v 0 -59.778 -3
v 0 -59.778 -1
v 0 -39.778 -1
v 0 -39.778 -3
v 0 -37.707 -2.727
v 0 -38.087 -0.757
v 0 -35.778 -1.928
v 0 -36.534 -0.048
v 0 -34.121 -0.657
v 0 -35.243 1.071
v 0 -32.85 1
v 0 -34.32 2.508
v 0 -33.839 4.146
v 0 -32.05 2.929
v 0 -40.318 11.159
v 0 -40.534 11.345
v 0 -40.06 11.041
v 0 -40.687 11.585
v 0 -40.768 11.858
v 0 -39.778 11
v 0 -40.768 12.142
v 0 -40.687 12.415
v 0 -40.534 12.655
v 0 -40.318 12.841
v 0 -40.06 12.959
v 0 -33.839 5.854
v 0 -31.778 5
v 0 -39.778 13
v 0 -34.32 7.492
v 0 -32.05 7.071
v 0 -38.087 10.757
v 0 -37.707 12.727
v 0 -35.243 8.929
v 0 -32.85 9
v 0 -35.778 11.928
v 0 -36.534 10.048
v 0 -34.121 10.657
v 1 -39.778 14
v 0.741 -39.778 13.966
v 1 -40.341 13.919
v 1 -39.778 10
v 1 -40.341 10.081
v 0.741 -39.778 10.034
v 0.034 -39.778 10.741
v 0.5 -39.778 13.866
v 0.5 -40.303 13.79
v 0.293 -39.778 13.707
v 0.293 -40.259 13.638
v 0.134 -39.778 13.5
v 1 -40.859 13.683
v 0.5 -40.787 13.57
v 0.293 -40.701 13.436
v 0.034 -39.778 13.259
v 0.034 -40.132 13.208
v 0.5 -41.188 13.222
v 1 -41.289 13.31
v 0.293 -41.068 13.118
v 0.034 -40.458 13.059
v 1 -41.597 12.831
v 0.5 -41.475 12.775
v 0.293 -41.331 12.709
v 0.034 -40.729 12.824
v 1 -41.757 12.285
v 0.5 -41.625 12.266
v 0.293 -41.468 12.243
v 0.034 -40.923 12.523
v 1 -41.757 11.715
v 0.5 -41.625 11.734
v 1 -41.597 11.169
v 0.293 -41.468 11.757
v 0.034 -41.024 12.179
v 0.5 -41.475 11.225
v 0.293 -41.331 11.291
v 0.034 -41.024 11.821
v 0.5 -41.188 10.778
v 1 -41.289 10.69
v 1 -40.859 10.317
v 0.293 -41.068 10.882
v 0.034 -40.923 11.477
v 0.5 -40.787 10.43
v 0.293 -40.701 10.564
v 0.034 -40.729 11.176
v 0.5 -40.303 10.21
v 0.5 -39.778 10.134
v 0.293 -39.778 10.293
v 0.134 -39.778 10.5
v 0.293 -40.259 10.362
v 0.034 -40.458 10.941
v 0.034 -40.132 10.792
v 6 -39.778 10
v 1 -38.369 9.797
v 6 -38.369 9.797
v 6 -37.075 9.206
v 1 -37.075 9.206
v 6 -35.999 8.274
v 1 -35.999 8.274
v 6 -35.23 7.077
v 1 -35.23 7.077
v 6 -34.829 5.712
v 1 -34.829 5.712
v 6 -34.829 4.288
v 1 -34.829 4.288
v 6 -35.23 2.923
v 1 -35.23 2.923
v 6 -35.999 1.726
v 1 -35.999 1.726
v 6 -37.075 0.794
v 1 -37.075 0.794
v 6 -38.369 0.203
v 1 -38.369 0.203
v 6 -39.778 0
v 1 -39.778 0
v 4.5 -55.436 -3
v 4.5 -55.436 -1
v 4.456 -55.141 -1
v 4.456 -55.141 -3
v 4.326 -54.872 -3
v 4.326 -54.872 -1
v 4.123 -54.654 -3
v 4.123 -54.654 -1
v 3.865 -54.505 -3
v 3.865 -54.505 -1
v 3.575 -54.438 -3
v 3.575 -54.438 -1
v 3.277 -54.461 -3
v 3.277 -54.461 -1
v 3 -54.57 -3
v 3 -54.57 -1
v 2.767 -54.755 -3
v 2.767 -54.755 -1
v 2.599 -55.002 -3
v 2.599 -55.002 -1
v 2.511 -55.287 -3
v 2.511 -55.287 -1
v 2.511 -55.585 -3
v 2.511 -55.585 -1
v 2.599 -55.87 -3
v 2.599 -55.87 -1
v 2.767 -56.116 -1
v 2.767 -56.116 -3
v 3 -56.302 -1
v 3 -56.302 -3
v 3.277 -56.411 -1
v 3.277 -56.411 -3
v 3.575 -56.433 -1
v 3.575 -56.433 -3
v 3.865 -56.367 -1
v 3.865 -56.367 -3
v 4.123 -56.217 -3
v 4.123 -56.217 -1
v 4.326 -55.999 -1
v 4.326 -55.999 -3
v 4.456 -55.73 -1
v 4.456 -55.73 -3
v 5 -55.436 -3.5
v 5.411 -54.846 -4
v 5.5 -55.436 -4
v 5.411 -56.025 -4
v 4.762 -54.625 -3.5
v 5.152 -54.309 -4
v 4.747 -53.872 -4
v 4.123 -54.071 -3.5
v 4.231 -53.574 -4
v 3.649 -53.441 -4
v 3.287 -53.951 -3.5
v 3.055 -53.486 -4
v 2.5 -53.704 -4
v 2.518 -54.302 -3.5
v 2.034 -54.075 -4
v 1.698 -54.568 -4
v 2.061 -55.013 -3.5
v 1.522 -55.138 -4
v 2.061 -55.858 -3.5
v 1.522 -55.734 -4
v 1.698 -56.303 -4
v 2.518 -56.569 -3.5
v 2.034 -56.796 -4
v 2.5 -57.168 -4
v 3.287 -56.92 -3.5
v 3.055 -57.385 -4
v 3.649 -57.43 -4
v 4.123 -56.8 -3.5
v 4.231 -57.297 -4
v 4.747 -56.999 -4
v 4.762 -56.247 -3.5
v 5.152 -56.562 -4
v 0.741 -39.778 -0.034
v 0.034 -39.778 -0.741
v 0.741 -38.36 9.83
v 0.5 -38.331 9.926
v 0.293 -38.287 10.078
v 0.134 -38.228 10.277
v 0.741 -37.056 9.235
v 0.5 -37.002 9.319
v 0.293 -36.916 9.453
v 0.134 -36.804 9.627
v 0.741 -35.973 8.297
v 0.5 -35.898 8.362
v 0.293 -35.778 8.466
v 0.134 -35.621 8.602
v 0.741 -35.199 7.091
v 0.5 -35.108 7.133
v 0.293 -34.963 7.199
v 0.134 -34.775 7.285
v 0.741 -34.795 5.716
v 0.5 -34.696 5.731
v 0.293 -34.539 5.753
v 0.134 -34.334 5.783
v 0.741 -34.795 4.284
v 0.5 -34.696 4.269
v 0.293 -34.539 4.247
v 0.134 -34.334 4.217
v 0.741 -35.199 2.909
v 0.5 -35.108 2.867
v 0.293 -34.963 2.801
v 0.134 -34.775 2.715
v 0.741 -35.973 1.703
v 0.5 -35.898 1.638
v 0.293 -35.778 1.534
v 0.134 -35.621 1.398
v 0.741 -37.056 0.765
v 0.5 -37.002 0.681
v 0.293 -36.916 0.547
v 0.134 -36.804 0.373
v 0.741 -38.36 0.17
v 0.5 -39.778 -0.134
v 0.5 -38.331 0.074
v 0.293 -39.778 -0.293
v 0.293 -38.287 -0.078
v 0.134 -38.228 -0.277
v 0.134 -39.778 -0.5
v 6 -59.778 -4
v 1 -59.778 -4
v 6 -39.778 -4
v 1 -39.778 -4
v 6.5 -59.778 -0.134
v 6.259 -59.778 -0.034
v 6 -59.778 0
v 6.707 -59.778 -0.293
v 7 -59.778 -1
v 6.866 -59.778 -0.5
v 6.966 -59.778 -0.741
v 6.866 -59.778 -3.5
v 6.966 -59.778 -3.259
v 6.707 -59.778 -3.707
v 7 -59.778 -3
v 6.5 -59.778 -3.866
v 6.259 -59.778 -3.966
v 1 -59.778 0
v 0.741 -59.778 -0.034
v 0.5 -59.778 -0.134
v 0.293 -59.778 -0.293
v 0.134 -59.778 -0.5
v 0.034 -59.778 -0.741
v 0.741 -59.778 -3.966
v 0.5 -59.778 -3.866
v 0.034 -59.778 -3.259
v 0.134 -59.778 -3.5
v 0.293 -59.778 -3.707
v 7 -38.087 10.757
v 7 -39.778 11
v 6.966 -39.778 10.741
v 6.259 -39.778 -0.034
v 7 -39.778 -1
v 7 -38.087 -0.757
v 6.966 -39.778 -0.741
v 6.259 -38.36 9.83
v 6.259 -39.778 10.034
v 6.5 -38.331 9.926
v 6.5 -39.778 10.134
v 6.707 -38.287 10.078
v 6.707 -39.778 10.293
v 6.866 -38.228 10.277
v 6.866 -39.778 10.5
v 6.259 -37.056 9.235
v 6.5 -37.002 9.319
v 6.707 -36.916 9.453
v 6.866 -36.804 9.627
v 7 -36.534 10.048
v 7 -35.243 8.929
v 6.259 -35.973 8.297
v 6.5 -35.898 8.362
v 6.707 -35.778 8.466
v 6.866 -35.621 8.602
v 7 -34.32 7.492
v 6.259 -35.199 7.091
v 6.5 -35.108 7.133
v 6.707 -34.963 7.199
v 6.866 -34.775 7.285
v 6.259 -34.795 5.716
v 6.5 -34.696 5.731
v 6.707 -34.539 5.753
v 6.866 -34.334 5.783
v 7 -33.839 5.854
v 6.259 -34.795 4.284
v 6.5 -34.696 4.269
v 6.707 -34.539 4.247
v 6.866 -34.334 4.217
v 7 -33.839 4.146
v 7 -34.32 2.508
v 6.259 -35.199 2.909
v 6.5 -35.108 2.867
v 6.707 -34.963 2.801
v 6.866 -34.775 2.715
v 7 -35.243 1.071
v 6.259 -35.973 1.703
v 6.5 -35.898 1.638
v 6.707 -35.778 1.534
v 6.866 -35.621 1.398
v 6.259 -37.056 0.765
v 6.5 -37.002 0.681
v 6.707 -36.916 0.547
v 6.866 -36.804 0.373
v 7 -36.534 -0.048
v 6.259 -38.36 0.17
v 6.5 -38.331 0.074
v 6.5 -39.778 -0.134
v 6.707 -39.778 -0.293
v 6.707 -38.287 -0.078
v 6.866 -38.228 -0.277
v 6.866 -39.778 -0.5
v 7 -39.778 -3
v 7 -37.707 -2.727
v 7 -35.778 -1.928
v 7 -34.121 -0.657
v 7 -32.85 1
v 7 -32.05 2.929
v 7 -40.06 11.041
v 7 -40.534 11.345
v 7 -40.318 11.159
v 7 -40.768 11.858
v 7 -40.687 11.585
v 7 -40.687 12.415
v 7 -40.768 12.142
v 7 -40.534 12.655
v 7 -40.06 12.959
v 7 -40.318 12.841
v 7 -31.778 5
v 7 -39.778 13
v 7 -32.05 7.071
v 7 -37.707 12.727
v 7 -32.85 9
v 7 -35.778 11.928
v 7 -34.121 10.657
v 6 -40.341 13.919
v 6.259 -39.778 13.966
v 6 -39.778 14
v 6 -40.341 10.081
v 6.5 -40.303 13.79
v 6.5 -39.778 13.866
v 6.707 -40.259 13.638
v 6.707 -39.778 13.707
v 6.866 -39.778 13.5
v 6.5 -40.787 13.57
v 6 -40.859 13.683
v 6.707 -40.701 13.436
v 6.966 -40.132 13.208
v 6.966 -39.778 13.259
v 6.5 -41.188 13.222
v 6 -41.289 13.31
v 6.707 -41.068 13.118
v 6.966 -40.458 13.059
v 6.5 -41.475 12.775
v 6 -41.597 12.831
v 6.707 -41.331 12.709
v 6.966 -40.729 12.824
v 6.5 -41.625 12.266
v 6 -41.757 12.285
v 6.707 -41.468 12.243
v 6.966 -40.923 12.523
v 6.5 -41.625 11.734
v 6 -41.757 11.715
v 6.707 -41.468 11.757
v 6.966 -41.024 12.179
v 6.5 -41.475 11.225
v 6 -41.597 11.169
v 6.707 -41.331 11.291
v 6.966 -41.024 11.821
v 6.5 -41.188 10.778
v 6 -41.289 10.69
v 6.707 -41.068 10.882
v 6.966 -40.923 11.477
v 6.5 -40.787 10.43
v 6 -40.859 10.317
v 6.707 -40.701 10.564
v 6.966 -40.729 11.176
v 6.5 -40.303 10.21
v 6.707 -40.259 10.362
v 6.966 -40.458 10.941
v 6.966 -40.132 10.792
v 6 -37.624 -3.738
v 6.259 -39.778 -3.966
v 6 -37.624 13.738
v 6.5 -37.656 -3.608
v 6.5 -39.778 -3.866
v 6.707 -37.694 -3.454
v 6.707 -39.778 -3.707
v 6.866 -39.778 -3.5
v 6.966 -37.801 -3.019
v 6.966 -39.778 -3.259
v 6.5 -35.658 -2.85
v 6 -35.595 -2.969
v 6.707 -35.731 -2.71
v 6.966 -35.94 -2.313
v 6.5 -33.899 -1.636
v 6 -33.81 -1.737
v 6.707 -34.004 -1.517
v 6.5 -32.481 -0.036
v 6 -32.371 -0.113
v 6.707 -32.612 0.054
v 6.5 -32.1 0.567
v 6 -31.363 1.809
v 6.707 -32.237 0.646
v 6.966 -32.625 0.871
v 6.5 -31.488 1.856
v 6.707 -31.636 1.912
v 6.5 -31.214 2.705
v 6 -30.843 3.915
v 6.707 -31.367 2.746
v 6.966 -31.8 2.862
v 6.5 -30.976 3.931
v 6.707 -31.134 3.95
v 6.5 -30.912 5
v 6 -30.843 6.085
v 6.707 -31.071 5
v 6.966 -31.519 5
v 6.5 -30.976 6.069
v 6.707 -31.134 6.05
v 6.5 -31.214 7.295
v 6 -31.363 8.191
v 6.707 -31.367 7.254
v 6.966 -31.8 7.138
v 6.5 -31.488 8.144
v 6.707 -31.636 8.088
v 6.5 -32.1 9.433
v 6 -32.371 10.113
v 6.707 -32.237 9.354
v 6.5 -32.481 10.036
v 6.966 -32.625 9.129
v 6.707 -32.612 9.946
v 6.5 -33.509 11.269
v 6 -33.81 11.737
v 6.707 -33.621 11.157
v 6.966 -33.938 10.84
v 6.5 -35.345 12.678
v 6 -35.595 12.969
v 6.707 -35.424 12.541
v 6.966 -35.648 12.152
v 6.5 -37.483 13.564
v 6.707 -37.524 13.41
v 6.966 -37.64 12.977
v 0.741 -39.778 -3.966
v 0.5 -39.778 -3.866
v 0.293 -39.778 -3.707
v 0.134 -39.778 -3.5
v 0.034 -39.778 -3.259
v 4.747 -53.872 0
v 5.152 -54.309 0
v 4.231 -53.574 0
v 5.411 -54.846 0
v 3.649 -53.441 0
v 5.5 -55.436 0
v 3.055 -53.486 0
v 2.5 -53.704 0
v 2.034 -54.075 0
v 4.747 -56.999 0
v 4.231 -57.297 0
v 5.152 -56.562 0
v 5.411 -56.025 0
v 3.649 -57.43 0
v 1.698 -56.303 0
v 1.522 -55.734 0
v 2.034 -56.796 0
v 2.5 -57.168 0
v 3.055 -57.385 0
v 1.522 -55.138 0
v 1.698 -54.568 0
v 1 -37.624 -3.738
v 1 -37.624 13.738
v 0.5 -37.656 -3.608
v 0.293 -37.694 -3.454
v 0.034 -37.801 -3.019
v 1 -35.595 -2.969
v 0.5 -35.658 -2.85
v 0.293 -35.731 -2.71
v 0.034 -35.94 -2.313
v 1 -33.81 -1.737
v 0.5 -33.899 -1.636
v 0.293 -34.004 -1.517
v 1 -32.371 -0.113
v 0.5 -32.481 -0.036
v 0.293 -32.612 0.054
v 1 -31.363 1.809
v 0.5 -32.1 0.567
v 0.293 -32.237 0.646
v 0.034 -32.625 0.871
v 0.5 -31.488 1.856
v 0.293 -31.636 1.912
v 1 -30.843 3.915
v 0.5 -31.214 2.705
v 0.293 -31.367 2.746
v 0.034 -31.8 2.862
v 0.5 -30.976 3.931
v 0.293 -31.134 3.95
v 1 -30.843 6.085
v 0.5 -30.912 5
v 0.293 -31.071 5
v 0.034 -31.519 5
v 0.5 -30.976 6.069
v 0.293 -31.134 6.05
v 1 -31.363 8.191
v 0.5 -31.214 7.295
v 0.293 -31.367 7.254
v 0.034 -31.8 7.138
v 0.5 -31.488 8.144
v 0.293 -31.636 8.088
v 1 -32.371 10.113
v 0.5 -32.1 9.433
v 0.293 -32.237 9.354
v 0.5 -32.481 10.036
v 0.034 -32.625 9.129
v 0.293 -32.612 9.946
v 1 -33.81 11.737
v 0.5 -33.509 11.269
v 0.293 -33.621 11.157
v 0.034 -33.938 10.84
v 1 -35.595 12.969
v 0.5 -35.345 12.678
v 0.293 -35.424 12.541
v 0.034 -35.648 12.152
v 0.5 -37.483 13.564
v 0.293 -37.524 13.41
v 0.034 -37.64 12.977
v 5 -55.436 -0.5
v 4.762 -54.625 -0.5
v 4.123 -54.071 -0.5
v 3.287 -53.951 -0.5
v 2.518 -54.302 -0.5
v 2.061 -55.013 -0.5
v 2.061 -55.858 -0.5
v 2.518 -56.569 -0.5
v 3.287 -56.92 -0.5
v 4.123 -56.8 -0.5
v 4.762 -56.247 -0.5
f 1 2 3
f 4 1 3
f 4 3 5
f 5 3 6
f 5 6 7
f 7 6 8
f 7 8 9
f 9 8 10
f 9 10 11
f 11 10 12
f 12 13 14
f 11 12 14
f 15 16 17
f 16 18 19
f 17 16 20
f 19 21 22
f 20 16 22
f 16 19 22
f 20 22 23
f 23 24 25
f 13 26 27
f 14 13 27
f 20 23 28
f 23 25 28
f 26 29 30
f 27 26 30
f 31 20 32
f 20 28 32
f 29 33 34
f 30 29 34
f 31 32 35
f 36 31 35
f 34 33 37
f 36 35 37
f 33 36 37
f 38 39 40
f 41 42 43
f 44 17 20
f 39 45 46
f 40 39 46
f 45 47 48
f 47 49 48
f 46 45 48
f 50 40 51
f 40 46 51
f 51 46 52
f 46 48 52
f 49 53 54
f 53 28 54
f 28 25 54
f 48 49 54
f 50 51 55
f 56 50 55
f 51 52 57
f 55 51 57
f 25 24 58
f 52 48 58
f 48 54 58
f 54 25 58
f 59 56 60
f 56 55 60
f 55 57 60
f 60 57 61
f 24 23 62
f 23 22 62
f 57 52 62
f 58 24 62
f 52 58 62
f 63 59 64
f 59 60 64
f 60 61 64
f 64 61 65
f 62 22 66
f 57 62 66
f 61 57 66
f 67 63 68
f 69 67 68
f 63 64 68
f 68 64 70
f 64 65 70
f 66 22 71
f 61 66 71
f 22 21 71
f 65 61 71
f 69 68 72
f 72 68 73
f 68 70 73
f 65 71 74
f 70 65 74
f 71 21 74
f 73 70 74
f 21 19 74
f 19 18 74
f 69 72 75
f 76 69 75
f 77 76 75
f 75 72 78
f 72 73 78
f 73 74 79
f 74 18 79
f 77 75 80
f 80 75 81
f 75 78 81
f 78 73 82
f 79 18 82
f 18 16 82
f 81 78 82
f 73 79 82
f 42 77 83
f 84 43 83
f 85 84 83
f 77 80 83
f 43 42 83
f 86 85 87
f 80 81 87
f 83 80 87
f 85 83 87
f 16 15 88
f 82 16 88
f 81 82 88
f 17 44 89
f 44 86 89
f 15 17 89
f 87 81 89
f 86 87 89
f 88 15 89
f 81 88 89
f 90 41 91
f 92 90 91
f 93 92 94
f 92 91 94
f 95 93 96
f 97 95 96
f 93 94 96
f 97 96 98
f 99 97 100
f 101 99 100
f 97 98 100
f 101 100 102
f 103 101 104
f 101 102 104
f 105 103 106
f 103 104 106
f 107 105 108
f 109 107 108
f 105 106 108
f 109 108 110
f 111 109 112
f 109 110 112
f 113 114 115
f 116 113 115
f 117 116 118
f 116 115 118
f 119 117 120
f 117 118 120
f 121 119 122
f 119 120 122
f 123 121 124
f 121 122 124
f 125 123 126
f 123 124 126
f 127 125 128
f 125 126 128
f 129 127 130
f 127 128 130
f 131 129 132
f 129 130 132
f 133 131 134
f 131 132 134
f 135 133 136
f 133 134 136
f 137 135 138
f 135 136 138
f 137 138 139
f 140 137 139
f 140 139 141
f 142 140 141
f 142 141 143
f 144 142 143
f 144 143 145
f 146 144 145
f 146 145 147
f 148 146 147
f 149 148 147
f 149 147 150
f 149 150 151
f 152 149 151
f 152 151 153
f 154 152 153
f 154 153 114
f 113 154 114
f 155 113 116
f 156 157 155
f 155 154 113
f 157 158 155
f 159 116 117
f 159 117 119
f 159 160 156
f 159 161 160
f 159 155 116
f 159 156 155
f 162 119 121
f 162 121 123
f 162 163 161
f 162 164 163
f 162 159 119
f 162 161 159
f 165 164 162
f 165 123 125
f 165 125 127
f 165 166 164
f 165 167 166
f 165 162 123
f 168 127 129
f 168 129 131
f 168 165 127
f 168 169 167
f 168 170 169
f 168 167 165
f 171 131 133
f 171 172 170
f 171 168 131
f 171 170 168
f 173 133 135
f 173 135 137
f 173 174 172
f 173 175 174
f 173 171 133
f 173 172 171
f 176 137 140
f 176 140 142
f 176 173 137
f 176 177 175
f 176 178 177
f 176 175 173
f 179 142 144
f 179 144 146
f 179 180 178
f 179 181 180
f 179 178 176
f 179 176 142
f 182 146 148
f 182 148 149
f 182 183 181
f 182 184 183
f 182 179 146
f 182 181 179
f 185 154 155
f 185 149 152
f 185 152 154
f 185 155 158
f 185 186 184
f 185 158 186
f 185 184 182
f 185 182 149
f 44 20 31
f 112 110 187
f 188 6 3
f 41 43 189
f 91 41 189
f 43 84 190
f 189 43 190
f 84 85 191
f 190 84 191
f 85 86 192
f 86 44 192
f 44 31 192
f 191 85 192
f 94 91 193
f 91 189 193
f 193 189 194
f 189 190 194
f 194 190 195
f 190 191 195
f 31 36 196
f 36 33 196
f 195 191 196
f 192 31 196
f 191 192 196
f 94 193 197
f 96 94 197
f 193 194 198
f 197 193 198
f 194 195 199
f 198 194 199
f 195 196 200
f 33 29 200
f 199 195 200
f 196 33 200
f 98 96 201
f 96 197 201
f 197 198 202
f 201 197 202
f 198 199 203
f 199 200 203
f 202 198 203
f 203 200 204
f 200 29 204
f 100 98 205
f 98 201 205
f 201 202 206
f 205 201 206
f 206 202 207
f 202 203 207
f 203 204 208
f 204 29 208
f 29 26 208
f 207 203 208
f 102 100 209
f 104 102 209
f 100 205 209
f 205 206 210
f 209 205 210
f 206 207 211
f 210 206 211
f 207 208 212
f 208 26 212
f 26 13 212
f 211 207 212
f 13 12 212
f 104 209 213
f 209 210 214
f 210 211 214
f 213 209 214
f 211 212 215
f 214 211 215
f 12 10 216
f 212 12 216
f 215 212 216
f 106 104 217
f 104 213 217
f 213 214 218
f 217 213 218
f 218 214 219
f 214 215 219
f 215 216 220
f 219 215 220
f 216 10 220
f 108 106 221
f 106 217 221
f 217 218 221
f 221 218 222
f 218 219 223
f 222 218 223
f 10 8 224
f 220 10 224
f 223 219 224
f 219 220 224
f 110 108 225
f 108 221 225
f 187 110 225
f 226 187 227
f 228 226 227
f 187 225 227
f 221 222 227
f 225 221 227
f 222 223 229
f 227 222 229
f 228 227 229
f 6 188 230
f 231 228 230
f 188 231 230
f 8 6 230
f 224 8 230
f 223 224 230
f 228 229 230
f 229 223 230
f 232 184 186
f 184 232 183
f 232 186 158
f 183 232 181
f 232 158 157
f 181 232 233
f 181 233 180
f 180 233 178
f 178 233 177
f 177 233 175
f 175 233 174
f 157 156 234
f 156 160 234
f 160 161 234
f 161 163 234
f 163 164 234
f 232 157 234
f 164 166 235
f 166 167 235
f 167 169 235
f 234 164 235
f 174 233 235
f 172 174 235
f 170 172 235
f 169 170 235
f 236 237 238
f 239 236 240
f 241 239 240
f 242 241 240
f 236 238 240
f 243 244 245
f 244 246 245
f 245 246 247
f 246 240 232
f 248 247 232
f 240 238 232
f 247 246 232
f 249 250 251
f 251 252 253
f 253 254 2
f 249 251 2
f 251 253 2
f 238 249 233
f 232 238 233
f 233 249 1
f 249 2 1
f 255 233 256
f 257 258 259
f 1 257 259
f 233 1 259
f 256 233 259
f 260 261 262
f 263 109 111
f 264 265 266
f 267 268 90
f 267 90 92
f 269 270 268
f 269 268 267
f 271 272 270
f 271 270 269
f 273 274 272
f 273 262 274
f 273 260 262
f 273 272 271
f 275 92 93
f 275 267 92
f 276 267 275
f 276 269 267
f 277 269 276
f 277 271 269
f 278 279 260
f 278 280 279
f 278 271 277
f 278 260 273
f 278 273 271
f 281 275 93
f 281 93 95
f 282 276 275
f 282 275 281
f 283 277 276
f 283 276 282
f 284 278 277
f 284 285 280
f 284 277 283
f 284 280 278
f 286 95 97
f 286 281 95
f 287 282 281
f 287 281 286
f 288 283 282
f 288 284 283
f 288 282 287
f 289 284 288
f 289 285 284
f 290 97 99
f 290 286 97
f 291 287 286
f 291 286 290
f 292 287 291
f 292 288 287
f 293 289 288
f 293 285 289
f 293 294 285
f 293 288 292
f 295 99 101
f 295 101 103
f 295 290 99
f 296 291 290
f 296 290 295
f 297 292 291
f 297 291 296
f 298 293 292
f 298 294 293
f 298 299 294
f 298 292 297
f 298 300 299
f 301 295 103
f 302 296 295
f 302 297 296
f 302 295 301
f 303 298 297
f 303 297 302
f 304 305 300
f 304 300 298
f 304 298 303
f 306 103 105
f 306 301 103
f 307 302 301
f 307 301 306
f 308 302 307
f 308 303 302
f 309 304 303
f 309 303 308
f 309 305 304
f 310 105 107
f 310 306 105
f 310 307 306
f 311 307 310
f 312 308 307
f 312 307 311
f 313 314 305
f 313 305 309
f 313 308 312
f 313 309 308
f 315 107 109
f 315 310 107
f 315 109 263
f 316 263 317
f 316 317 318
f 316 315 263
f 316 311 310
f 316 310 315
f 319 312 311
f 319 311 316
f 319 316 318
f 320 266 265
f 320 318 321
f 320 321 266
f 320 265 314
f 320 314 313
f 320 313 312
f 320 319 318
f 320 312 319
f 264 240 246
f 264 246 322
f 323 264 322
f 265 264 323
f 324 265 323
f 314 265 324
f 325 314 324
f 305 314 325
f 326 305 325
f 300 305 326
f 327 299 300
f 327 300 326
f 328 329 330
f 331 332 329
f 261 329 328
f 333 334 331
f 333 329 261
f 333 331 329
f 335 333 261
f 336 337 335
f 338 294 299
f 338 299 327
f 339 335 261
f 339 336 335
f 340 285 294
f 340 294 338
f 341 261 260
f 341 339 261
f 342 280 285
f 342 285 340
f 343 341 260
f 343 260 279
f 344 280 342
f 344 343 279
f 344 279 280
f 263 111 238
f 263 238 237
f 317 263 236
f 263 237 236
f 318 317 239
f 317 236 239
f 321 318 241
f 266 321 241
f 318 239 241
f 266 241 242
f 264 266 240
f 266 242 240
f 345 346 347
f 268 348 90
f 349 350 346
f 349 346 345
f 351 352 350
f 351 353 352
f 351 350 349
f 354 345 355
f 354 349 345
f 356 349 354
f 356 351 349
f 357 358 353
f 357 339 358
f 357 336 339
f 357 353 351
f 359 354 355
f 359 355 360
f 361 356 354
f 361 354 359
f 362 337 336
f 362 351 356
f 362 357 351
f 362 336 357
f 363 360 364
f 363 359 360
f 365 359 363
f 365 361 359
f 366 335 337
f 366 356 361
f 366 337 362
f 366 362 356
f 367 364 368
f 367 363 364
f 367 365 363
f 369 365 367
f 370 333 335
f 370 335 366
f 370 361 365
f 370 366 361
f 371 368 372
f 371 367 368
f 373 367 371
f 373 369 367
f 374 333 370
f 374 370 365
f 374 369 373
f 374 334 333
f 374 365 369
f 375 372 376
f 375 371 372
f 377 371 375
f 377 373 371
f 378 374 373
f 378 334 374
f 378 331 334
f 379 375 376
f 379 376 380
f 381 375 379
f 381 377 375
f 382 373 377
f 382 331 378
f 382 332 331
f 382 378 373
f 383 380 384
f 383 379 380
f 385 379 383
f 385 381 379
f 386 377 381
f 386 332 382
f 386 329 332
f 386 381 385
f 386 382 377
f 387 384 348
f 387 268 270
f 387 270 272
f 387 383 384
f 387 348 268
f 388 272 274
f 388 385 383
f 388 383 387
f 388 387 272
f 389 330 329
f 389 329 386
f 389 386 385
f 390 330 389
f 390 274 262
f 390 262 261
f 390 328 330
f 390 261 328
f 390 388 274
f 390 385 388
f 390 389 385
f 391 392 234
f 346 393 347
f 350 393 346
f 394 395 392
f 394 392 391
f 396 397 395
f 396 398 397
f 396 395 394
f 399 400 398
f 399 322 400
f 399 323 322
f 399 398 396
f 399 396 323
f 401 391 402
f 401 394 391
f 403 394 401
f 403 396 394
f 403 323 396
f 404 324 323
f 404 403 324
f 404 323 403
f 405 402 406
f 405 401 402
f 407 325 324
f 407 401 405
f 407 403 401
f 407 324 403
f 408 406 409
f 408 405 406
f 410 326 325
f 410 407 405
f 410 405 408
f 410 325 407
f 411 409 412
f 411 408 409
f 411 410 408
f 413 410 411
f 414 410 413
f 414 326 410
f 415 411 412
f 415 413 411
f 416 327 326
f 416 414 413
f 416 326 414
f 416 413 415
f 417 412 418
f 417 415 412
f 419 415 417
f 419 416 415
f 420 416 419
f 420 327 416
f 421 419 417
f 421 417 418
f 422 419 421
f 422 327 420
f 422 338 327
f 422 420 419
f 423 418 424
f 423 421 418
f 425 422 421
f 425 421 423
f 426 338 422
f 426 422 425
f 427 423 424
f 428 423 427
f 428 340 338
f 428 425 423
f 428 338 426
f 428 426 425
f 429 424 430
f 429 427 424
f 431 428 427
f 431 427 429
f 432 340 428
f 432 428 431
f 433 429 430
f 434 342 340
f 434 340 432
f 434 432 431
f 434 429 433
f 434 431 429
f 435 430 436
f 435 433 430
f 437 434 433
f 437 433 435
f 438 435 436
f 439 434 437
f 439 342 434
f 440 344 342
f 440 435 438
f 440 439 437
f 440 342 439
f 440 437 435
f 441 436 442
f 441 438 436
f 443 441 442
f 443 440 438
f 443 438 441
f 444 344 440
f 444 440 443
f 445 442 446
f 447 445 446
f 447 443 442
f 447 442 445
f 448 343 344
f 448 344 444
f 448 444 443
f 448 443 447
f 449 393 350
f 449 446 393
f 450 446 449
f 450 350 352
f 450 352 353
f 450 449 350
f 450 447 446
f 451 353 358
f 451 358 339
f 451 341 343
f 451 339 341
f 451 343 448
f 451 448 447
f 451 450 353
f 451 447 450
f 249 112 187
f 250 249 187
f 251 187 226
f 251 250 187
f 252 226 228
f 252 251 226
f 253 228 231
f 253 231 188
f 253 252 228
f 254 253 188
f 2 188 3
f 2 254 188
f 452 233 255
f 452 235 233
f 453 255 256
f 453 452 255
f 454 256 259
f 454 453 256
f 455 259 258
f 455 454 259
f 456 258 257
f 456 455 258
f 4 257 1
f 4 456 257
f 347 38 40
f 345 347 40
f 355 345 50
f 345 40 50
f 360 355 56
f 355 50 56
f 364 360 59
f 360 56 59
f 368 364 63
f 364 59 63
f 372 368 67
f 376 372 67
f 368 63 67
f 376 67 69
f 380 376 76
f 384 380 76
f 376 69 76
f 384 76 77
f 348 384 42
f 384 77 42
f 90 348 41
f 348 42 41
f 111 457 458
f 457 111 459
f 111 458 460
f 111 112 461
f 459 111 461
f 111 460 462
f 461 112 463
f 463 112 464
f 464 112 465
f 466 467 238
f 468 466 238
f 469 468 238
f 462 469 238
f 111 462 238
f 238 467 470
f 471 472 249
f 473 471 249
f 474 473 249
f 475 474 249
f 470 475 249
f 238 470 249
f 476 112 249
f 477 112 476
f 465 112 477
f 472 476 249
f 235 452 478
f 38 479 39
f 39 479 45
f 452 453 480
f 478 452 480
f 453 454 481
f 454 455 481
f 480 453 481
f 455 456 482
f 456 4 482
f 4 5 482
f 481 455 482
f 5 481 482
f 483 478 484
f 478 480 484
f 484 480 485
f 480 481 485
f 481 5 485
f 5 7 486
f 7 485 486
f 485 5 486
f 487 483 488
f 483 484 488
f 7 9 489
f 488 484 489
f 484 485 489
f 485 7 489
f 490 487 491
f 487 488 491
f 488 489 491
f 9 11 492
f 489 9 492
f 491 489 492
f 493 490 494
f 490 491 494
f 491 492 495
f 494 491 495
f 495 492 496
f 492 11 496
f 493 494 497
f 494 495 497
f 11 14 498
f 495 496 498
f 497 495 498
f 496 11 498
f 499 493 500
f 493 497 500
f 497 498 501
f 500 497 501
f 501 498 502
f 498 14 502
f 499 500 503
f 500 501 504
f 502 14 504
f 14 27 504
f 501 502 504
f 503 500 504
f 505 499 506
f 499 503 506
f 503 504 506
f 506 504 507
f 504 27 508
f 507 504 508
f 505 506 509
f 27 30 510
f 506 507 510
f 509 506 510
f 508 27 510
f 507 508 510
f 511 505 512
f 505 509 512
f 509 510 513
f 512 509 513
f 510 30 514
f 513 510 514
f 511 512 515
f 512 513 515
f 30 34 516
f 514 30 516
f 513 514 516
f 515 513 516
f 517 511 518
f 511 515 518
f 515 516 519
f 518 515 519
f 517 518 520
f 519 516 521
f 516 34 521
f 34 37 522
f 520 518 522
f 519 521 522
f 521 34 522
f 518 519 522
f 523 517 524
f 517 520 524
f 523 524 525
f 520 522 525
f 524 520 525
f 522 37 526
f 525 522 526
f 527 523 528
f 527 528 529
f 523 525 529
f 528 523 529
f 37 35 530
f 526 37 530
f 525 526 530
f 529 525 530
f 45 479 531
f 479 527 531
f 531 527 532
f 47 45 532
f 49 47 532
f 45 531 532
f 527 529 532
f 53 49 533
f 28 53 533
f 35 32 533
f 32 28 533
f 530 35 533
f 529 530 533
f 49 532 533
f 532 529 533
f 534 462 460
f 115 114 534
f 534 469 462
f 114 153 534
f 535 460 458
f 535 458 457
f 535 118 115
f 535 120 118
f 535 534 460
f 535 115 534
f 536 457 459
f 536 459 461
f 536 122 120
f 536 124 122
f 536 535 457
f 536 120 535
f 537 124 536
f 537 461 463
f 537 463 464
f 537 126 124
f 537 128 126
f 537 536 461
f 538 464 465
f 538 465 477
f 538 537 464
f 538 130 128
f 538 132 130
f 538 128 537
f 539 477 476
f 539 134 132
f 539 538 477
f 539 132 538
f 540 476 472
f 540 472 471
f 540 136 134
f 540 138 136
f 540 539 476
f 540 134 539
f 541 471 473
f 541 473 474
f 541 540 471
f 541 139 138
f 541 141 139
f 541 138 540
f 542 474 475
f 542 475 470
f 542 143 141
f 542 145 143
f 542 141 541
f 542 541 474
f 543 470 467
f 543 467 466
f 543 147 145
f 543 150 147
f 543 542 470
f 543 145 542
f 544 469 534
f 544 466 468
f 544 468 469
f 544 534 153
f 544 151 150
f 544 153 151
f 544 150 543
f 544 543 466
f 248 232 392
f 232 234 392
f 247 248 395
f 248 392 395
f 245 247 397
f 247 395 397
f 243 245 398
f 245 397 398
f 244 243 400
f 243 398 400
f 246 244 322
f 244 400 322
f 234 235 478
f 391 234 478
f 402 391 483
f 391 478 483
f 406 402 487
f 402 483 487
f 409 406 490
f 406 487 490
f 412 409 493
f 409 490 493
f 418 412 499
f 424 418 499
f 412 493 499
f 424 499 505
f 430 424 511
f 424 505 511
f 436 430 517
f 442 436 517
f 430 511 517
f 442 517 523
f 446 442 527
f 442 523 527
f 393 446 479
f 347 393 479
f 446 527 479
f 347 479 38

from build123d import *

# Parameters (mm, degrees)
F1_DEPTH = 7
F2_R     = 1
F3_DEPTH = 25
F4_SIZE  = 1
F5_R     = 1


with BuildPart() as f1:
    # F0 (on Right) → F1 (new body)
    with BuildSketch(Plane.YZ):
        with BuildLine():
            Line((-39.777774, 0), (-59.777774, 0))
            Line((-59.777774, 0), (-59.777774, -4))
            Line((-59.777774, -4), (-39.777774, -4))
            ThreePointArc((-39.777774, -4), (-30.777774, 5), (-39.777774, 14))
            ThreePointArc((-39.777774, 14), (-41.777774, 12), (-39.777774, 10))
            ThreePointArc((-39.777774, 10), (-34.777774, 5), (-39.777774, 0))
        make_face()
    extrude(amount=F1_DEPTH)

    # F2 (on face) → F3 (cut)
    with BuildSketch(Plane.XY):
        with Locations((3.5, -55.435631)):
            Circle(F2_R)
    extrude(amount=-F3_DEPTH, mode=Mode.SUBTRACT)

    # F4
    f4_edges = [f1.edges().sort_by_distance(p)[0] for p in [
        (2.5, -55.435631, 0),
        (2.5, -55.435631, -4),
    ]]
    chamfer(f4_edges, length=F4_SIZE)

    # F5
    f5_edges = [f1.edges().sort_by_distance(p)[0] for p in [
        (7, -49.777774, 0),
        (7, -34.777774, 5),
        (0, -49.777774, 0),
        (0, -34.777774, 5),
    ]]
    fillet(f5_edges, radius=F5_R)


solid = f1.part
